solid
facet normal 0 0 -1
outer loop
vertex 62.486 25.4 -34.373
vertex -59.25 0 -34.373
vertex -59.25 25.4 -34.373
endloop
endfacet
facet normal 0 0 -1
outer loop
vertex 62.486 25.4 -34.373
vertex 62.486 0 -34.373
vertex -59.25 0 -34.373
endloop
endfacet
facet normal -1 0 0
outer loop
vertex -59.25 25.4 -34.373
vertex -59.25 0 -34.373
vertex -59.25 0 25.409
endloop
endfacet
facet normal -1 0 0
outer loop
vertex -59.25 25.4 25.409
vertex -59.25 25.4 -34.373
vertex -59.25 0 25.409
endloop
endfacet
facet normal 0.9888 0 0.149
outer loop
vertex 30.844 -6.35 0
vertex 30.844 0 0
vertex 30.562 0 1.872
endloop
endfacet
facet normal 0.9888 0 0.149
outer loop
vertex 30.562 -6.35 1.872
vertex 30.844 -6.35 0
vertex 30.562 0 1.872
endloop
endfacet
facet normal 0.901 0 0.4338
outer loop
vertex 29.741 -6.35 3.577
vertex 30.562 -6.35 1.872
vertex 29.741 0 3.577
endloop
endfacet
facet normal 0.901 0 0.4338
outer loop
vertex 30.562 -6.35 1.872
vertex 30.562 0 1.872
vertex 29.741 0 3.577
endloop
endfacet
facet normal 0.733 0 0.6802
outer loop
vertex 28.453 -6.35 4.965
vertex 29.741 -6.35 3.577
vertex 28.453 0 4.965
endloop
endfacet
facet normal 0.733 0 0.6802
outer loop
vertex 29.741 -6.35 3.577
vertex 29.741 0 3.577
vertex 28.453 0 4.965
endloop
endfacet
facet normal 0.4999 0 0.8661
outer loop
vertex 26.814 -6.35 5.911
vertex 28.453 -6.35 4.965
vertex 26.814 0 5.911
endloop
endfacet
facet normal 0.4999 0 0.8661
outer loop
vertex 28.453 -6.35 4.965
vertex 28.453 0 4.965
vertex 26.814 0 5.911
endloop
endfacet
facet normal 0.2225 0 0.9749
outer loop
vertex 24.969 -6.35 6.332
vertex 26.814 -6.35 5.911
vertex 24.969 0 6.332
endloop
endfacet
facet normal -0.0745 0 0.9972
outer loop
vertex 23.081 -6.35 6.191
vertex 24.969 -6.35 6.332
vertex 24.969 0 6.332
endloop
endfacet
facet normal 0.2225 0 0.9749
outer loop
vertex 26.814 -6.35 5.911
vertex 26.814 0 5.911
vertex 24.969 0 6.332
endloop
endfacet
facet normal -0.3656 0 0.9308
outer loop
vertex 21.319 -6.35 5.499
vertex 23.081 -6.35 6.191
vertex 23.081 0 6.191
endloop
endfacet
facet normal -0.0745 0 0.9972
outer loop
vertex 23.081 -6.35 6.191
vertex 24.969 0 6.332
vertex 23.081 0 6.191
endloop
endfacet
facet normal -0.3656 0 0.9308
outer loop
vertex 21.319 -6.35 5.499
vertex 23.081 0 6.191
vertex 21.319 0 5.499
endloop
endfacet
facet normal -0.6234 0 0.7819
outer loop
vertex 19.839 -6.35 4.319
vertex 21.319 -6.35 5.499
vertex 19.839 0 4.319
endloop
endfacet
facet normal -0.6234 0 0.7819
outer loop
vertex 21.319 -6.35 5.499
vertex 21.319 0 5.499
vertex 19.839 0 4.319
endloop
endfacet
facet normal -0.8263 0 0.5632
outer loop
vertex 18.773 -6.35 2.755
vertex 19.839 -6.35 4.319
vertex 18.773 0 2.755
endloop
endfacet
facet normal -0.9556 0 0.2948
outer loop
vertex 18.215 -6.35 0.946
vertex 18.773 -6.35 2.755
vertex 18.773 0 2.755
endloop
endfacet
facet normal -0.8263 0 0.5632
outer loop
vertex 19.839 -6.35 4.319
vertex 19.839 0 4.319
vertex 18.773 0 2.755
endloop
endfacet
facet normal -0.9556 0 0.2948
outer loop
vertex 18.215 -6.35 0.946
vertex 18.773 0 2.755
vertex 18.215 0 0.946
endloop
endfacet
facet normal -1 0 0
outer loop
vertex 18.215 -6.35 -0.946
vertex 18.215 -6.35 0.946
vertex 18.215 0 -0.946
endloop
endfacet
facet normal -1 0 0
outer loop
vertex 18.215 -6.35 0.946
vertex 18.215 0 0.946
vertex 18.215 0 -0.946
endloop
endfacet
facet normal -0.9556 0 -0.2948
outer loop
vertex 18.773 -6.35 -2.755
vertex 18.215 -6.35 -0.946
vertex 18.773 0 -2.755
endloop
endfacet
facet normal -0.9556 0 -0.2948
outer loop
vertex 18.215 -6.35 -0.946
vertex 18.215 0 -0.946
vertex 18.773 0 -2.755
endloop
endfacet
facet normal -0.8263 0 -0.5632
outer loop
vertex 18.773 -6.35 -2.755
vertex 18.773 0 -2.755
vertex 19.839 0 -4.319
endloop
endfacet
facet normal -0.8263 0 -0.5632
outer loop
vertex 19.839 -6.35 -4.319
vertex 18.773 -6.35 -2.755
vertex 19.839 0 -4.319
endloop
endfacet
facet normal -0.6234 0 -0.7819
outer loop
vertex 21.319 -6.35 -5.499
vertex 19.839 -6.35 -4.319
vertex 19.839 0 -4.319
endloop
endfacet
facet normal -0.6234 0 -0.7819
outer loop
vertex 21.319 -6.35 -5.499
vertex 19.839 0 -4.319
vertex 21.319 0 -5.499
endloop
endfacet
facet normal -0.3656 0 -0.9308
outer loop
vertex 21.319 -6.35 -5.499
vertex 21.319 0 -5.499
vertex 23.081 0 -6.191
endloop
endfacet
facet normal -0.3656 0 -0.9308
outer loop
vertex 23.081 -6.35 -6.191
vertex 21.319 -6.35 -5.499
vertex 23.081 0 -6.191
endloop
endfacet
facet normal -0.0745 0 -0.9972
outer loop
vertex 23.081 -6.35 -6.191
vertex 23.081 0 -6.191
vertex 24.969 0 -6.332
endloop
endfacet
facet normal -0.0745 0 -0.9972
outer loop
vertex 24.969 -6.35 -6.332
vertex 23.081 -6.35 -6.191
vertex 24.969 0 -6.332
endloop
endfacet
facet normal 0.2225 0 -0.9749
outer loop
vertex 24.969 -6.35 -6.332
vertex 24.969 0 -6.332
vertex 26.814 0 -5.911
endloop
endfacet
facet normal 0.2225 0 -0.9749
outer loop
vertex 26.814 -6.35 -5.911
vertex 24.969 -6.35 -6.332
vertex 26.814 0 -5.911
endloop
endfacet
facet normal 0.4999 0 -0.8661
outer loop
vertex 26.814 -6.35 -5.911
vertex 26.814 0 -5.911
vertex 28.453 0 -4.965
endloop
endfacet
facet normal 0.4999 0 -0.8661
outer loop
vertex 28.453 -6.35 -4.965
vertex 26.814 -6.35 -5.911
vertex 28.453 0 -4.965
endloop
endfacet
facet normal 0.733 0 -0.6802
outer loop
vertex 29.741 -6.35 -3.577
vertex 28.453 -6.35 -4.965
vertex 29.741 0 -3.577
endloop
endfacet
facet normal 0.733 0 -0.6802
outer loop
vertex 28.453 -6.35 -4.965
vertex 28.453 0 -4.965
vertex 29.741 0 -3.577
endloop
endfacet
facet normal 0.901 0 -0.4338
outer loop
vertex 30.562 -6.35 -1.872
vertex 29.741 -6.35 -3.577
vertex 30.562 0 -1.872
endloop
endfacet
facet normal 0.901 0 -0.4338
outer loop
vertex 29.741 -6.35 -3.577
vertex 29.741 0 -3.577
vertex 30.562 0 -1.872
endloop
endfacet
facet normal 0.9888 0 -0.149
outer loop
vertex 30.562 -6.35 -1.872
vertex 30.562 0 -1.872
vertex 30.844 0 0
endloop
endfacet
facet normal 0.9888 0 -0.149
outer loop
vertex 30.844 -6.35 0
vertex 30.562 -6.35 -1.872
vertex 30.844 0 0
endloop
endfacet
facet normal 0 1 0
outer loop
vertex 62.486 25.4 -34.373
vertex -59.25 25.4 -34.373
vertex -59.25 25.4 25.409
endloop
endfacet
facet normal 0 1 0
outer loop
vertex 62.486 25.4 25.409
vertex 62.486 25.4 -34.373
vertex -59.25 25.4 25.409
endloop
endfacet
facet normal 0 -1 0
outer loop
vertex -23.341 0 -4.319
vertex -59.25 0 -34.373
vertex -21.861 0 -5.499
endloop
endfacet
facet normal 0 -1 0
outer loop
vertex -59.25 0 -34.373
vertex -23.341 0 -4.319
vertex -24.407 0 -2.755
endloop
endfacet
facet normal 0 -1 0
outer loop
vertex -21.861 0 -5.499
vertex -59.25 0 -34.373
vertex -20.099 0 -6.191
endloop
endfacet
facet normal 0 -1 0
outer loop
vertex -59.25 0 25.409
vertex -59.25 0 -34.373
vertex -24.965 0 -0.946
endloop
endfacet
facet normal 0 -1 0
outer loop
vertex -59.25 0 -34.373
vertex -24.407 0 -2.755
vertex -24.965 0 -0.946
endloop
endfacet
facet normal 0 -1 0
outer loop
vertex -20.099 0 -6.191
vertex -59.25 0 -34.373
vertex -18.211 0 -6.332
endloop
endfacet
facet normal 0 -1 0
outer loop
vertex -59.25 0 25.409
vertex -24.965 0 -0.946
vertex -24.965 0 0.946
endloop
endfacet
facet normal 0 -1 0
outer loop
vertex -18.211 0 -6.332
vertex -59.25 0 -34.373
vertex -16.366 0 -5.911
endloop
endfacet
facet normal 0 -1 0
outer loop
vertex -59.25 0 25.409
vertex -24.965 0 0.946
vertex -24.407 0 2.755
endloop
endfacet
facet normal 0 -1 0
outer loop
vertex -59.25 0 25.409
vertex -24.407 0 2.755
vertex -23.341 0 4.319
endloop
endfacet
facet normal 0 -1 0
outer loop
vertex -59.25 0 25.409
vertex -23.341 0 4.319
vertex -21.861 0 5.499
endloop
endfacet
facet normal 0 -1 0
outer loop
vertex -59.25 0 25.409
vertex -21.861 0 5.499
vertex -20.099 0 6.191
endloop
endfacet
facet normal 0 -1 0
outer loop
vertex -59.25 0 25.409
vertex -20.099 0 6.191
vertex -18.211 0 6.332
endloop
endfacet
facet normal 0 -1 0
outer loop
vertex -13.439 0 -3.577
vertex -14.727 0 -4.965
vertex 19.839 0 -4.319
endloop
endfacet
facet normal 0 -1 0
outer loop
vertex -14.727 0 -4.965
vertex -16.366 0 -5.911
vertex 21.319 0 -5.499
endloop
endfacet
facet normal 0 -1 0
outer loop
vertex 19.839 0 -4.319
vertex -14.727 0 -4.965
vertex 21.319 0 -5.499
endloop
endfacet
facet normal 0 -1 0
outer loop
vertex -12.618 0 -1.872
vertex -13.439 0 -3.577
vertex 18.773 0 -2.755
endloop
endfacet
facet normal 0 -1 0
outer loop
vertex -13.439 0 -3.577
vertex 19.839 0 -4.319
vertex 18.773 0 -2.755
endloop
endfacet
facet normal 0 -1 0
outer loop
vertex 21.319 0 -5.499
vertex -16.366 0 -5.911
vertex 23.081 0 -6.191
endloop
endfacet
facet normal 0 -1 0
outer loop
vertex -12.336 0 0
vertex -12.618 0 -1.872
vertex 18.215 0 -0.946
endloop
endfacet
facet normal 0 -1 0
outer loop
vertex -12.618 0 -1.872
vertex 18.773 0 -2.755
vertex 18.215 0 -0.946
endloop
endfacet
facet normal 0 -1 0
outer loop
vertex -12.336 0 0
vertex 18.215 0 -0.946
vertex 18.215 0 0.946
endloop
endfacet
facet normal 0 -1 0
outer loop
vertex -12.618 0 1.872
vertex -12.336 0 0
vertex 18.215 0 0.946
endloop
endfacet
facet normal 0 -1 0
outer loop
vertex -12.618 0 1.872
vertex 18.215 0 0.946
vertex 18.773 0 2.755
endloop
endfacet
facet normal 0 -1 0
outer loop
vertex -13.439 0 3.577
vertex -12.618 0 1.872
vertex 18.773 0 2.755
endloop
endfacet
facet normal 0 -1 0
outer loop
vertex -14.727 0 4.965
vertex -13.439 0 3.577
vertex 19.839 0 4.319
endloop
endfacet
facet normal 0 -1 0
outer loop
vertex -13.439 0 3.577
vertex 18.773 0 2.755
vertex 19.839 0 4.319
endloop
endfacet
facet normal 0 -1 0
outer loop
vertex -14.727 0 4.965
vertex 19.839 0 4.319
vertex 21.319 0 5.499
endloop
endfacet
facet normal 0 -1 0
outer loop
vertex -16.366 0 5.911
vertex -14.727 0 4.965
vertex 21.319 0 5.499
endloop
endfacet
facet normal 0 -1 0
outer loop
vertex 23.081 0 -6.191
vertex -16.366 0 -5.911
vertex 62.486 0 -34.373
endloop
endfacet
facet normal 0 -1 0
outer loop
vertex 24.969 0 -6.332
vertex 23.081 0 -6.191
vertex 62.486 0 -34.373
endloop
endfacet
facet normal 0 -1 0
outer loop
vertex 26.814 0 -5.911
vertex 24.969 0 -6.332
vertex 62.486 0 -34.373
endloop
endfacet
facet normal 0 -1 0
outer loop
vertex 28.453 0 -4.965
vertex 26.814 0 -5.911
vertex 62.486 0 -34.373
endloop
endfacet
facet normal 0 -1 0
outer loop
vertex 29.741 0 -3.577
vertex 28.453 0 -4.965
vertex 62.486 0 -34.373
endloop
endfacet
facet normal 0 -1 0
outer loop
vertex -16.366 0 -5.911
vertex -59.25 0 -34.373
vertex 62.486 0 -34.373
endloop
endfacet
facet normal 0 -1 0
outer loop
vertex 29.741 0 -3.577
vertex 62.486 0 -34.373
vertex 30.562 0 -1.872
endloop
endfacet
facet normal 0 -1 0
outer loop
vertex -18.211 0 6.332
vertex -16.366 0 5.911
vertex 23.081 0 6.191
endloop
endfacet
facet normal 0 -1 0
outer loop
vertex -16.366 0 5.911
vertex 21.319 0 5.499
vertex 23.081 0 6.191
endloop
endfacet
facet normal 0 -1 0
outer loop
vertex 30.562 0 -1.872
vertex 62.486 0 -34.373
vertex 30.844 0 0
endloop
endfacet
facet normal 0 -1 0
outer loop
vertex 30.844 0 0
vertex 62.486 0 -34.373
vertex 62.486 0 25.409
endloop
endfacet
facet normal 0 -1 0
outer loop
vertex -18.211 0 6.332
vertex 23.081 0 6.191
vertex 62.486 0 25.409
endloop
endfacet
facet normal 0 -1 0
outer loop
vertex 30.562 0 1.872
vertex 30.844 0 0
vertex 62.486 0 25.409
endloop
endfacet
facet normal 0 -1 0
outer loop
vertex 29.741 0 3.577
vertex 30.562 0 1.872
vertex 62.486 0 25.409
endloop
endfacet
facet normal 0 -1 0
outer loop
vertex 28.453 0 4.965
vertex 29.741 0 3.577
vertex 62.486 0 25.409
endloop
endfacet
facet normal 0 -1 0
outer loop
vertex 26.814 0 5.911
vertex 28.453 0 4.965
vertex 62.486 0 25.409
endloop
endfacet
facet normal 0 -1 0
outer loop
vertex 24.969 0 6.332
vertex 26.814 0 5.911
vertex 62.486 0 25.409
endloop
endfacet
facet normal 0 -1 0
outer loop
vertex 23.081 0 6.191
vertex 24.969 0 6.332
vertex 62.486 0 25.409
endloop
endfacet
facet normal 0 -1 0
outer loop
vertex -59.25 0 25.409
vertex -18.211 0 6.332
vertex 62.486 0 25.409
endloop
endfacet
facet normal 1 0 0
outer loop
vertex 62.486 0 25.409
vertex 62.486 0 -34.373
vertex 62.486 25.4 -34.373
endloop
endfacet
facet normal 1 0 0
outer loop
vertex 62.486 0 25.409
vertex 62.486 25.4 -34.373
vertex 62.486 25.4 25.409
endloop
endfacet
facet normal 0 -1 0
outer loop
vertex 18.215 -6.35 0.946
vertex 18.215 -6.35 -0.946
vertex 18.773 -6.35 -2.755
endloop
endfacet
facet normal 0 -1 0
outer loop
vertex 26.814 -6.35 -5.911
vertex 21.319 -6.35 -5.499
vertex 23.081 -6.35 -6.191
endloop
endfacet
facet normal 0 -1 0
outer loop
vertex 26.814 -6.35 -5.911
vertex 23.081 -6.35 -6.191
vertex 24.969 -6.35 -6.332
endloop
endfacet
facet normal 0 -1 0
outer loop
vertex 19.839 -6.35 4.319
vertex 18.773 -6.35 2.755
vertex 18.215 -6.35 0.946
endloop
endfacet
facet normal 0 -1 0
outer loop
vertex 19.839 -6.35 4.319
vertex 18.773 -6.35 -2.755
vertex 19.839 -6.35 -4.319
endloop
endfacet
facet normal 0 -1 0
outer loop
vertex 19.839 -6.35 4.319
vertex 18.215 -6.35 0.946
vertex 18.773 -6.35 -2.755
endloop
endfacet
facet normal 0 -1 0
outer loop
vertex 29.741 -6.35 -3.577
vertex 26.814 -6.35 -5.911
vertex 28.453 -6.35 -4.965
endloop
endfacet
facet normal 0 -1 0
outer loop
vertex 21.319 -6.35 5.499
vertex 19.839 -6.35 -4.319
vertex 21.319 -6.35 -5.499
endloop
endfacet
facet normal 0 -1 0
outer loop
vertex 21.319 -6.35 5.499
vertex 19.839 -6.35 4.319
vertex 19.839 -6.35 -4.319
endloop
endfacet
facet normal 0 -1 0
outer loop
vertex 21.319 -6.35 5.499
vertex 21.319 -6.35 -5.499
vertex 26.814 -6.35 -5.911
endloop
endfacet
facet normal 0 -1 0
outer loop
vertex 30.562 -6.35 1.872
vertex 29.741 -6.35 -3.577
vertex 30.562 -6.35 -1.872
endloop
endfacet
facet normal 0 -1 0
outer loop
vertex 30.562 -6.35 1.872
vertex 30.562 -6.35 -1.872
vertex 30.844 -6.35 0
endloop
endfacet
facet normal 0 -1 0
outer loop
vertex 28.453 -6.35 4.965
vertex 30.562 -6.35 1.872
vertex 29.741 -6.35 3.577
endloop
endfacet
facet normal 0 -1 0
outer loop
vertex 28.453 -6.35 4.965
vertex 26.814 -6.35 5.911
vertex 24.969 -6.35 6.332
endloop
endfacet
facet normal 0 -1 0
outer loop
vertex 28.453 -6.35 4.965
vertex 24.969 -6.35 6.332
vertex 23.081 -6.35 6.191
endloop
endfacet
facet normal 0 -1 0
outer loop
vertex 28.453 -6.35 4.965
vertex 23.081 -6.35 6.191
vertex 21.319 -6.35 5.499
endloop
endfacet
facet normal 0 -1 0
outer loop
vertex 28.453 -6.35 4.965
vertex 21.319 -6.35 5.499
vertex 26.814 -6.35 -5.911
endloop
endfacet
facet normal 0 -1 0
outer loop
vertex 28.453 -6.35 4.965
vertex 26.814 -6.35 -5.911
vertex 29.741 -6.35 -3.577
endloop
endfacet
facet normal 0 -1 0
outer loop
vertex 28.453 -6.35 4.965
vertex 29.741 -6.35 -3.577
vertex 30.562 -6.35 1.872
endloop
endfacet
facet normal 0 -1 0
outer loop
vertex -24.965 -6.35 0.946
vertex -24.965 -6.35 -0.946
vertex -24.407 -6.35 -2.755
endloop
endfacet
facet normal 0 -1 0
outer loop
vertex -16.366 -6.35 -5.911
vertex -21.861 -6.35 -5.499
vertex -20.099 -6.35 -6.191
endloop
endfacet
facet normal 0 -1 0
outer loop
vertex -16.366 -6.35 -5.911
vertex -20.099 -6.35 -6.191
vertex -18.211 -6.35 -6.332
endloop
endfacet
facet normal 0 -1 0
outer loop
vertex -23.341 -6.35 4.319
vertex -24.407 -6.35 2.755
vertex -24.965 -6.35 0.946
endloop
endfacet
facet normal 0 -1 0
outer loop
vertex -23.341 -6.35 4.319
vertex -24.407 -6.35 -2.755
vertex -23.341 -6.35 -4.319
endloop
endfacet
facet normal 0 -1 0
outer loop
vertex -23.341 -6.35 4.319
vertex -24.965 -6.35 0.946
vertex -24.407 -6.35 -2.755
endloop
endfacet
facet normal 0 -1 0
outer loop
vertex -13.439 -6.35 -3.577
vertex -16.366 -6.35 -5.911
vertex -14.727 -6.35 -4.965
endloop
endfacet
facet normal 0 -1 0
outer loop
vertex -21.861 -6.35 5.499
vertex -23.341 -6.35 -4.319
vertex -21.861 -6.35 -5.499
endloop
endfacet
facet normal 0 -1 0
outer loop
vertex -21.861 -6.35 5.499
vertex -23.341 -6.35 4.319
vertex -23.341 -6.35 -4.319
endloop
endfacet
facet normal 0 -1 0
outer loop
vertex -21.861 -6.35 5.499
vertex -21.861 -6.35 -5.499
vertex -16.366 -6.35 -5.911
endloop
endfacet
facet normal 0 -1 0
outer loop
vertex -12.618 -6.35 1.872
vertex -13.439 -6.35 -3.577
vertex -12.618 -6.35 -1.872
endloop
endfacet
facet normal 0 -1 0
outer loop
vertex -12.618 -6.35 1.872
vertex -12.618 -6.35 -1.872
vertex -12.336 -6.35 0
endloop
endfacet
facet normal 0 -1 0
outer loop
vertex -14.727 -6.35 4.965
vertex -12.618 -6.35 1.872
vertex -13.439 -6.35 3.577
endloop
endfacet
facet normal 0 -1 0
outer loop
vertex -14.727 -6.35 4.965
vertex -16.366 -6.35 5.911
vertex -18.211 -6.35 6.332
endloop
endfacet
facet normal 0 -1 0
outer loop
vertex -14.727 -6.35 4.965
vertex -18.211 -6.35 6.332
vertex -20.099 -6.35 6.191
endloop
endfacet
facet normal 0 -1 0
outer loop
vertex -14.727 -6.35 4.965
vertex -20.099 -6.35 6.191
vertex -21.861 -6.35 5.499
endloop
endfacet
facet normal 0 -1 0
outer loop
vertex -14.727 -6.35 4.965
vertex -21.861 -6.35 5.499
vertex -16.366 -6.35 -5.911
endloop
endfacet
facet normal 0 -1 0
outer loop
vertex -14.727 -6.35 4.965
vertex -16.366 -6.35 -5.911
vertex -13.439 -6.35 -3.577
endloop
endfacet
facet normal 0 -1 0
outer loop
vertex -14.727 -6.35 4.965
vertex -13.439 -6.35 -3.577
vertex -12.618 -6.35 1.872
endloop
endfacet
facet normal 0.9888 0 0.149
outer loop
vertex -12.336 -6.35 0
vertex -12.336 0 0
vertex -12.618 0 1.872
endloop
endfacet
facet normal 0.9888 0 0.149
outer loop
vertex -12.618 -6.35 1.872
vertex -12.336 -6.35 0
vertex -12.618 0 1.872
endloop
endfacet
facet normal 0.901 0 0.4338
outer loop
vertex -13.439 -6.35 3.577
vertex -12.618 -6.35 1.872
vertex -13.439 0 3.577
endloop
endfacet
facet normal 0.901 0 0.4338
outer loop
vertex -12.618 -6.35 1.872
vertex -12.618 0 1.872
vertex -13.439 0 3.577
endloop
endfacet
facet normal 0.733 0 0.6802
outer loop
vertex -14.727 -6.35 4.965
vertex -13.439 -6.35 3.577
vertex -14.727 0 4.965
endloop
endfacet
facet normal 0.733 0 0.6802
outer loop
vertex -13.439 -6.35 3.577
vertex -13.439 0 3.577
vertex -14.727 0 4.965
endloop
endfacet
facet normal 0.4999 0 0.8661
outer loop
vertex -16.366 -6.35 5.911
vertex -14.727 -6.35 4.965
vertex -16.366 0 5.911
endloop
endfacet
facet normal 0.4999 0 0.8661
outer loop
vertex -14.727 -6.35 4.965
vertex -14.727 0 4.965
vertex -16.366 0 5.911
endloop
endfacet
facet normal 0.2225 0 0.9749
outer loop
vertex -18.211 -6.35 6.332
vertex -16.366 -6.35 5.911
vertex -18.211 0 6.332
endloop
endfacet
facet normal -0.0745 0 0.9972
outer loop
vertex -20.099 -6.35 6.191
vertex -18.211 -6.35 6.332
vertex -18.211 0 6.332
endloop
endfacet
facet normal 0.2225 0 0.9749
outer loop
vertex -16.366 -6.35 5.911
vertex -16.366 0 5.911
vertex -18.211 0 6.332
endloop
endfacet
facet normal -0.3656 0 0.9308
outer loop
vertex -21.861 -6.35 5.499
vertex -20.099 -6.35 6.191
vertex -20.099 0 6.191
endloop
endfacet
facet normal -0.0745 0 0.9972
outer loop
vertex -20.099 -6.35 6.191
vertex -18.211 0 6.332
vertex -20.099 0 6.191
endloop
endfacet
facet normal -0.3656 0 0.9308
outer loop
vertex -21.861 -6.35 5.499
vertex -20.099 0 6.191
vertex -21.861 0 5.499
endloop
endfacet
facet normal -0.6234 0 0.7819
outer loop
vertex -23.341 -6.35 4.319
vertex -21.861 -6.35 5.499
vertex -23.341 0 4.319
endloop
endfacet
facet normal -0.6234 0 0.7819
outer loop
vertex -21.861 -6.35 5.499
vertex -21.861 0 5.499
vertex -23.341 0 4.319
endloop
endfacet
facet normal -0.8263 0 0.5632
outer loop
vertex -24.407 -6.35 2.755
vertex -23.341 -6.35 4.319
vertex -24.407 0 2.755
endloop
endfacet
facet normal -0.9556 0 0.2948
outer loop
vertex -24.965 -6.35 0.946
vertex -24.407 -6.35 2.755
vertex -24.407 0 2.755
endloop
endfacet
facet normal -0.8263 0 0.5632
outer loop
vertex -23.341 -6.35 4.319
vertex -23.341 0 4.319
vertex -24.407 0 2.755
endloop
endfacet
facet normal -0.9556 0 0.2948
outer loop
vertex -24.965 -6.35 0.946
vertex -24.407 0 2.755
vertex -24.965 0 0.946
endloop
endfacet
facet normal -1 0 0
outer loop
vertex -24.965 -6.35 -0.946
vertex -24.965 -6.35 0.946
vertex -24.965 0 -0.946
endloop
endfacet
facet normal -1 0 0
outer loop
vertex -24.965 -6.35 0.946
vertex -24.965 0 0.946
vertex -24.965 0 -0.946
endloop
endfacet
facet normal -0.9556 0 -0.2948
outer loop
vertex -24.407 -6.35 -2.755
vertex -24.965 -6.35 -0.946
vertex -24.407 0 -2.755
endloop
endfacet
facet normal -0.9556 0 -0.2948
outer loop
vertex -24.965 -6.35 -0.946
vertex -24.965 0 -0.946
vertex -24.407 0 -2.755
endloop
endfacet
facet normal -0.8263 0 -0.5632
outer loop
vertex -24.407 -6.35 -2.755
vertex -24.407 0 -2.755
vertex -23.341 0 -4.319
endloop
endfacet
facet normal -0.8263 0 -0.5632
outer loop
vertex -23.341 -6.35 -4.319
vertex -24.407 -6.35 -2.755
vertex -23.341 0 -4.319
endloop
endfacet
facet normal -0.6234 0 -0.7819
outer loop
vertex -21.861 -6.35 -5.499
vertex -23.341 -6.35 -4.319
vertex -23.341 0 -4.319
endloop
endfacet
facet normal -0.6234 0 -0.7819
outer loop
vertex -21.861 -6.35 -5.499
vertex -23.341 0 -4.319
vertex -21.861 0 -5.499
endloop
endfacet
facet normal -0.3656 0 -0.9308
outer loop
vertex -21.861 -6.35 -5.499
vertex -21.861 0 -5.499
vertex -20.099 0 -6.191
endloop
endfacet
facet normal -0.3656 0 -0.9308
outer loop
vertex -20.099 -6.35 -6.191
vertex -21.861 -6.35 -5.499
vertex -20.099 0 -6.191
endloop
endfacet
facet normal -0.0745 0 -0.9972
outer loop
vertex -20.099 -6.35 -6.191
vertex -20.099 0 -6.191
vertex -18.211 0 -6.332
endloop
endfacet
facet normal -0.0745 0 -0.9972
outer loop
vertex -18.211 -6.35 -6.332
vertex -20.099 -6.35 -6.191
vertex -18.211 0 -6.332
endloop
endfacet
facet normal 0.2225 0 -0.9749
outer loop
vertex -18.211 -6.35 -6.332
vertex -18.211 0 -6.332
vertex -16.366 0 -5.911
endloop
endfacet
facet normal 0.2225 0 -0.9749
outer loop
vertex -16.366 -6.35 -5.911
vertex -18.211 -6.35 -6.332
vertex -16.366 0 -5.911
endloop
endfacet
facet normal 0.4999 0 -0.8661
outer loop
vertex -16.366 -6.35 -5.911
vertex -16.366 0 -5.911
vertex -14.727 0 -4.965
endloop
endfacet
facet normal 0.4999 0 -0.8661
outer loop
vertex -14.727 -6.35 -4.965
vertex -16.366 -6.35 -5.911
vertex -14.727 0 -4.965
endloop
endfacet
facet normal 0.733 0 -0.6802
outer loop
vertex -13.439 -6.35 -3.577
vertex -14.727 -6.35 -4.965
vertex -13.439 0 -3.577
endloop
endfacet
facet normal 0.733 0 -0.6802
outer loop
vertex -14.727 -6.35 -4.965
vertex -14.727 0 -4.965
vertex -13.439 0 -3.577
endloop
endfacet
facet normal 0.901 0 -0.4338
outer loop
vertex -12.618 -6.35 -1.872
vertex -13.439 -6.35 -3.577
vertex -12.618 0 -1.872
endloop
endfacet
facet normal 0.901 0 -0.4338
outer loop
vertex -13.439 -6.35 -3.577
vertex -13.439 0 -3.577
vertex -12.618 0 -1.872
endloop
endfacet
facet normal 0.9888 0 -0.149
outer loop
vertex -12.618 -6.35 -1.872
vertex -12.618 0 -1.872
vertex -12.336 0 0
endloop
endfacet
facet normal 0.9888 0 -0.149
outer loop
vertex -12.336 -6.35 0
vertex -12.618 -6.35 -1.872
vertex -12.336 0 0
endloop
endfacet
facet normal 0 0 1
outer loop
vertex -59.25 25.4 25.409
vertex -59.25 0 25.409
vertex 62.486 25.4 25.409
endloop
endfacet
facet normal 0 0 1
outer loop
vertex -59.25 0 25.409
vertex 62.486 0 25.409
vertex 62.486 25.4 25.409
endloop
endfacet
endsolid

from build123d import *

# Parameters (mm, degrees)
F0_W     = 70.9361852596
F0_H     = 59.7819101843
F0_R     = 6.35
F1_DEPTH = 25.4
F2_DEPTH = 6.35
F3_DEPTH = 25.4
F4_DEPTH = 25.4


with BuildPart() as f1:
    # F0 (on Front) → F1 (new body)
    with BuildSketch(Plane.XZ):
        with Locations((1.6176216304, -4.4821556658)):
            Rectangle(F0_W, F0_H)
        with Locations((-18.6856686208, 0)):
            Circle(F0_R, mode=Mode.SUBTRACT)
        with Locations((24.4943313792, 0)):
            Circle(F0_R, mode=Mode.SUBTRACT)
        with Locations((-18.6856686208, 0)):
            Circle(F0_R)
        with Locations((24.4943313792, 0)):
            Circle(F0_R)
    extrude(amount=-F1_DEPTH)

    # F0 (on Front) → F2 (join)
    with BuildSketch(Plane.XZ):
        with Locations((-18.6856686208, 0)):
            Circle(F0_R)
        with Locations((24.4943313792, 0)):
            Circle(F0_R)
    extrude(amount=F2_DEPTH)

    # F3 (add): a face of the model
    f3_faces = [f1.faces().sort_by_distance(p)[0] for p in [
        (37.0857142603, 12.7, -4.4821556658),
    ]]
    extrude(f3_faces, amount=F3_DEPTH)

    # F4 (add): a face of the model
    f4_faces = [f1.faces().sort_by_distance(p)[0] for p in [
        (-33.8504709994, 12.7, -4.4821556658),
    ]]
    extrude(f4_faces, amount=F4_DEPTH)


solid = f1.part
